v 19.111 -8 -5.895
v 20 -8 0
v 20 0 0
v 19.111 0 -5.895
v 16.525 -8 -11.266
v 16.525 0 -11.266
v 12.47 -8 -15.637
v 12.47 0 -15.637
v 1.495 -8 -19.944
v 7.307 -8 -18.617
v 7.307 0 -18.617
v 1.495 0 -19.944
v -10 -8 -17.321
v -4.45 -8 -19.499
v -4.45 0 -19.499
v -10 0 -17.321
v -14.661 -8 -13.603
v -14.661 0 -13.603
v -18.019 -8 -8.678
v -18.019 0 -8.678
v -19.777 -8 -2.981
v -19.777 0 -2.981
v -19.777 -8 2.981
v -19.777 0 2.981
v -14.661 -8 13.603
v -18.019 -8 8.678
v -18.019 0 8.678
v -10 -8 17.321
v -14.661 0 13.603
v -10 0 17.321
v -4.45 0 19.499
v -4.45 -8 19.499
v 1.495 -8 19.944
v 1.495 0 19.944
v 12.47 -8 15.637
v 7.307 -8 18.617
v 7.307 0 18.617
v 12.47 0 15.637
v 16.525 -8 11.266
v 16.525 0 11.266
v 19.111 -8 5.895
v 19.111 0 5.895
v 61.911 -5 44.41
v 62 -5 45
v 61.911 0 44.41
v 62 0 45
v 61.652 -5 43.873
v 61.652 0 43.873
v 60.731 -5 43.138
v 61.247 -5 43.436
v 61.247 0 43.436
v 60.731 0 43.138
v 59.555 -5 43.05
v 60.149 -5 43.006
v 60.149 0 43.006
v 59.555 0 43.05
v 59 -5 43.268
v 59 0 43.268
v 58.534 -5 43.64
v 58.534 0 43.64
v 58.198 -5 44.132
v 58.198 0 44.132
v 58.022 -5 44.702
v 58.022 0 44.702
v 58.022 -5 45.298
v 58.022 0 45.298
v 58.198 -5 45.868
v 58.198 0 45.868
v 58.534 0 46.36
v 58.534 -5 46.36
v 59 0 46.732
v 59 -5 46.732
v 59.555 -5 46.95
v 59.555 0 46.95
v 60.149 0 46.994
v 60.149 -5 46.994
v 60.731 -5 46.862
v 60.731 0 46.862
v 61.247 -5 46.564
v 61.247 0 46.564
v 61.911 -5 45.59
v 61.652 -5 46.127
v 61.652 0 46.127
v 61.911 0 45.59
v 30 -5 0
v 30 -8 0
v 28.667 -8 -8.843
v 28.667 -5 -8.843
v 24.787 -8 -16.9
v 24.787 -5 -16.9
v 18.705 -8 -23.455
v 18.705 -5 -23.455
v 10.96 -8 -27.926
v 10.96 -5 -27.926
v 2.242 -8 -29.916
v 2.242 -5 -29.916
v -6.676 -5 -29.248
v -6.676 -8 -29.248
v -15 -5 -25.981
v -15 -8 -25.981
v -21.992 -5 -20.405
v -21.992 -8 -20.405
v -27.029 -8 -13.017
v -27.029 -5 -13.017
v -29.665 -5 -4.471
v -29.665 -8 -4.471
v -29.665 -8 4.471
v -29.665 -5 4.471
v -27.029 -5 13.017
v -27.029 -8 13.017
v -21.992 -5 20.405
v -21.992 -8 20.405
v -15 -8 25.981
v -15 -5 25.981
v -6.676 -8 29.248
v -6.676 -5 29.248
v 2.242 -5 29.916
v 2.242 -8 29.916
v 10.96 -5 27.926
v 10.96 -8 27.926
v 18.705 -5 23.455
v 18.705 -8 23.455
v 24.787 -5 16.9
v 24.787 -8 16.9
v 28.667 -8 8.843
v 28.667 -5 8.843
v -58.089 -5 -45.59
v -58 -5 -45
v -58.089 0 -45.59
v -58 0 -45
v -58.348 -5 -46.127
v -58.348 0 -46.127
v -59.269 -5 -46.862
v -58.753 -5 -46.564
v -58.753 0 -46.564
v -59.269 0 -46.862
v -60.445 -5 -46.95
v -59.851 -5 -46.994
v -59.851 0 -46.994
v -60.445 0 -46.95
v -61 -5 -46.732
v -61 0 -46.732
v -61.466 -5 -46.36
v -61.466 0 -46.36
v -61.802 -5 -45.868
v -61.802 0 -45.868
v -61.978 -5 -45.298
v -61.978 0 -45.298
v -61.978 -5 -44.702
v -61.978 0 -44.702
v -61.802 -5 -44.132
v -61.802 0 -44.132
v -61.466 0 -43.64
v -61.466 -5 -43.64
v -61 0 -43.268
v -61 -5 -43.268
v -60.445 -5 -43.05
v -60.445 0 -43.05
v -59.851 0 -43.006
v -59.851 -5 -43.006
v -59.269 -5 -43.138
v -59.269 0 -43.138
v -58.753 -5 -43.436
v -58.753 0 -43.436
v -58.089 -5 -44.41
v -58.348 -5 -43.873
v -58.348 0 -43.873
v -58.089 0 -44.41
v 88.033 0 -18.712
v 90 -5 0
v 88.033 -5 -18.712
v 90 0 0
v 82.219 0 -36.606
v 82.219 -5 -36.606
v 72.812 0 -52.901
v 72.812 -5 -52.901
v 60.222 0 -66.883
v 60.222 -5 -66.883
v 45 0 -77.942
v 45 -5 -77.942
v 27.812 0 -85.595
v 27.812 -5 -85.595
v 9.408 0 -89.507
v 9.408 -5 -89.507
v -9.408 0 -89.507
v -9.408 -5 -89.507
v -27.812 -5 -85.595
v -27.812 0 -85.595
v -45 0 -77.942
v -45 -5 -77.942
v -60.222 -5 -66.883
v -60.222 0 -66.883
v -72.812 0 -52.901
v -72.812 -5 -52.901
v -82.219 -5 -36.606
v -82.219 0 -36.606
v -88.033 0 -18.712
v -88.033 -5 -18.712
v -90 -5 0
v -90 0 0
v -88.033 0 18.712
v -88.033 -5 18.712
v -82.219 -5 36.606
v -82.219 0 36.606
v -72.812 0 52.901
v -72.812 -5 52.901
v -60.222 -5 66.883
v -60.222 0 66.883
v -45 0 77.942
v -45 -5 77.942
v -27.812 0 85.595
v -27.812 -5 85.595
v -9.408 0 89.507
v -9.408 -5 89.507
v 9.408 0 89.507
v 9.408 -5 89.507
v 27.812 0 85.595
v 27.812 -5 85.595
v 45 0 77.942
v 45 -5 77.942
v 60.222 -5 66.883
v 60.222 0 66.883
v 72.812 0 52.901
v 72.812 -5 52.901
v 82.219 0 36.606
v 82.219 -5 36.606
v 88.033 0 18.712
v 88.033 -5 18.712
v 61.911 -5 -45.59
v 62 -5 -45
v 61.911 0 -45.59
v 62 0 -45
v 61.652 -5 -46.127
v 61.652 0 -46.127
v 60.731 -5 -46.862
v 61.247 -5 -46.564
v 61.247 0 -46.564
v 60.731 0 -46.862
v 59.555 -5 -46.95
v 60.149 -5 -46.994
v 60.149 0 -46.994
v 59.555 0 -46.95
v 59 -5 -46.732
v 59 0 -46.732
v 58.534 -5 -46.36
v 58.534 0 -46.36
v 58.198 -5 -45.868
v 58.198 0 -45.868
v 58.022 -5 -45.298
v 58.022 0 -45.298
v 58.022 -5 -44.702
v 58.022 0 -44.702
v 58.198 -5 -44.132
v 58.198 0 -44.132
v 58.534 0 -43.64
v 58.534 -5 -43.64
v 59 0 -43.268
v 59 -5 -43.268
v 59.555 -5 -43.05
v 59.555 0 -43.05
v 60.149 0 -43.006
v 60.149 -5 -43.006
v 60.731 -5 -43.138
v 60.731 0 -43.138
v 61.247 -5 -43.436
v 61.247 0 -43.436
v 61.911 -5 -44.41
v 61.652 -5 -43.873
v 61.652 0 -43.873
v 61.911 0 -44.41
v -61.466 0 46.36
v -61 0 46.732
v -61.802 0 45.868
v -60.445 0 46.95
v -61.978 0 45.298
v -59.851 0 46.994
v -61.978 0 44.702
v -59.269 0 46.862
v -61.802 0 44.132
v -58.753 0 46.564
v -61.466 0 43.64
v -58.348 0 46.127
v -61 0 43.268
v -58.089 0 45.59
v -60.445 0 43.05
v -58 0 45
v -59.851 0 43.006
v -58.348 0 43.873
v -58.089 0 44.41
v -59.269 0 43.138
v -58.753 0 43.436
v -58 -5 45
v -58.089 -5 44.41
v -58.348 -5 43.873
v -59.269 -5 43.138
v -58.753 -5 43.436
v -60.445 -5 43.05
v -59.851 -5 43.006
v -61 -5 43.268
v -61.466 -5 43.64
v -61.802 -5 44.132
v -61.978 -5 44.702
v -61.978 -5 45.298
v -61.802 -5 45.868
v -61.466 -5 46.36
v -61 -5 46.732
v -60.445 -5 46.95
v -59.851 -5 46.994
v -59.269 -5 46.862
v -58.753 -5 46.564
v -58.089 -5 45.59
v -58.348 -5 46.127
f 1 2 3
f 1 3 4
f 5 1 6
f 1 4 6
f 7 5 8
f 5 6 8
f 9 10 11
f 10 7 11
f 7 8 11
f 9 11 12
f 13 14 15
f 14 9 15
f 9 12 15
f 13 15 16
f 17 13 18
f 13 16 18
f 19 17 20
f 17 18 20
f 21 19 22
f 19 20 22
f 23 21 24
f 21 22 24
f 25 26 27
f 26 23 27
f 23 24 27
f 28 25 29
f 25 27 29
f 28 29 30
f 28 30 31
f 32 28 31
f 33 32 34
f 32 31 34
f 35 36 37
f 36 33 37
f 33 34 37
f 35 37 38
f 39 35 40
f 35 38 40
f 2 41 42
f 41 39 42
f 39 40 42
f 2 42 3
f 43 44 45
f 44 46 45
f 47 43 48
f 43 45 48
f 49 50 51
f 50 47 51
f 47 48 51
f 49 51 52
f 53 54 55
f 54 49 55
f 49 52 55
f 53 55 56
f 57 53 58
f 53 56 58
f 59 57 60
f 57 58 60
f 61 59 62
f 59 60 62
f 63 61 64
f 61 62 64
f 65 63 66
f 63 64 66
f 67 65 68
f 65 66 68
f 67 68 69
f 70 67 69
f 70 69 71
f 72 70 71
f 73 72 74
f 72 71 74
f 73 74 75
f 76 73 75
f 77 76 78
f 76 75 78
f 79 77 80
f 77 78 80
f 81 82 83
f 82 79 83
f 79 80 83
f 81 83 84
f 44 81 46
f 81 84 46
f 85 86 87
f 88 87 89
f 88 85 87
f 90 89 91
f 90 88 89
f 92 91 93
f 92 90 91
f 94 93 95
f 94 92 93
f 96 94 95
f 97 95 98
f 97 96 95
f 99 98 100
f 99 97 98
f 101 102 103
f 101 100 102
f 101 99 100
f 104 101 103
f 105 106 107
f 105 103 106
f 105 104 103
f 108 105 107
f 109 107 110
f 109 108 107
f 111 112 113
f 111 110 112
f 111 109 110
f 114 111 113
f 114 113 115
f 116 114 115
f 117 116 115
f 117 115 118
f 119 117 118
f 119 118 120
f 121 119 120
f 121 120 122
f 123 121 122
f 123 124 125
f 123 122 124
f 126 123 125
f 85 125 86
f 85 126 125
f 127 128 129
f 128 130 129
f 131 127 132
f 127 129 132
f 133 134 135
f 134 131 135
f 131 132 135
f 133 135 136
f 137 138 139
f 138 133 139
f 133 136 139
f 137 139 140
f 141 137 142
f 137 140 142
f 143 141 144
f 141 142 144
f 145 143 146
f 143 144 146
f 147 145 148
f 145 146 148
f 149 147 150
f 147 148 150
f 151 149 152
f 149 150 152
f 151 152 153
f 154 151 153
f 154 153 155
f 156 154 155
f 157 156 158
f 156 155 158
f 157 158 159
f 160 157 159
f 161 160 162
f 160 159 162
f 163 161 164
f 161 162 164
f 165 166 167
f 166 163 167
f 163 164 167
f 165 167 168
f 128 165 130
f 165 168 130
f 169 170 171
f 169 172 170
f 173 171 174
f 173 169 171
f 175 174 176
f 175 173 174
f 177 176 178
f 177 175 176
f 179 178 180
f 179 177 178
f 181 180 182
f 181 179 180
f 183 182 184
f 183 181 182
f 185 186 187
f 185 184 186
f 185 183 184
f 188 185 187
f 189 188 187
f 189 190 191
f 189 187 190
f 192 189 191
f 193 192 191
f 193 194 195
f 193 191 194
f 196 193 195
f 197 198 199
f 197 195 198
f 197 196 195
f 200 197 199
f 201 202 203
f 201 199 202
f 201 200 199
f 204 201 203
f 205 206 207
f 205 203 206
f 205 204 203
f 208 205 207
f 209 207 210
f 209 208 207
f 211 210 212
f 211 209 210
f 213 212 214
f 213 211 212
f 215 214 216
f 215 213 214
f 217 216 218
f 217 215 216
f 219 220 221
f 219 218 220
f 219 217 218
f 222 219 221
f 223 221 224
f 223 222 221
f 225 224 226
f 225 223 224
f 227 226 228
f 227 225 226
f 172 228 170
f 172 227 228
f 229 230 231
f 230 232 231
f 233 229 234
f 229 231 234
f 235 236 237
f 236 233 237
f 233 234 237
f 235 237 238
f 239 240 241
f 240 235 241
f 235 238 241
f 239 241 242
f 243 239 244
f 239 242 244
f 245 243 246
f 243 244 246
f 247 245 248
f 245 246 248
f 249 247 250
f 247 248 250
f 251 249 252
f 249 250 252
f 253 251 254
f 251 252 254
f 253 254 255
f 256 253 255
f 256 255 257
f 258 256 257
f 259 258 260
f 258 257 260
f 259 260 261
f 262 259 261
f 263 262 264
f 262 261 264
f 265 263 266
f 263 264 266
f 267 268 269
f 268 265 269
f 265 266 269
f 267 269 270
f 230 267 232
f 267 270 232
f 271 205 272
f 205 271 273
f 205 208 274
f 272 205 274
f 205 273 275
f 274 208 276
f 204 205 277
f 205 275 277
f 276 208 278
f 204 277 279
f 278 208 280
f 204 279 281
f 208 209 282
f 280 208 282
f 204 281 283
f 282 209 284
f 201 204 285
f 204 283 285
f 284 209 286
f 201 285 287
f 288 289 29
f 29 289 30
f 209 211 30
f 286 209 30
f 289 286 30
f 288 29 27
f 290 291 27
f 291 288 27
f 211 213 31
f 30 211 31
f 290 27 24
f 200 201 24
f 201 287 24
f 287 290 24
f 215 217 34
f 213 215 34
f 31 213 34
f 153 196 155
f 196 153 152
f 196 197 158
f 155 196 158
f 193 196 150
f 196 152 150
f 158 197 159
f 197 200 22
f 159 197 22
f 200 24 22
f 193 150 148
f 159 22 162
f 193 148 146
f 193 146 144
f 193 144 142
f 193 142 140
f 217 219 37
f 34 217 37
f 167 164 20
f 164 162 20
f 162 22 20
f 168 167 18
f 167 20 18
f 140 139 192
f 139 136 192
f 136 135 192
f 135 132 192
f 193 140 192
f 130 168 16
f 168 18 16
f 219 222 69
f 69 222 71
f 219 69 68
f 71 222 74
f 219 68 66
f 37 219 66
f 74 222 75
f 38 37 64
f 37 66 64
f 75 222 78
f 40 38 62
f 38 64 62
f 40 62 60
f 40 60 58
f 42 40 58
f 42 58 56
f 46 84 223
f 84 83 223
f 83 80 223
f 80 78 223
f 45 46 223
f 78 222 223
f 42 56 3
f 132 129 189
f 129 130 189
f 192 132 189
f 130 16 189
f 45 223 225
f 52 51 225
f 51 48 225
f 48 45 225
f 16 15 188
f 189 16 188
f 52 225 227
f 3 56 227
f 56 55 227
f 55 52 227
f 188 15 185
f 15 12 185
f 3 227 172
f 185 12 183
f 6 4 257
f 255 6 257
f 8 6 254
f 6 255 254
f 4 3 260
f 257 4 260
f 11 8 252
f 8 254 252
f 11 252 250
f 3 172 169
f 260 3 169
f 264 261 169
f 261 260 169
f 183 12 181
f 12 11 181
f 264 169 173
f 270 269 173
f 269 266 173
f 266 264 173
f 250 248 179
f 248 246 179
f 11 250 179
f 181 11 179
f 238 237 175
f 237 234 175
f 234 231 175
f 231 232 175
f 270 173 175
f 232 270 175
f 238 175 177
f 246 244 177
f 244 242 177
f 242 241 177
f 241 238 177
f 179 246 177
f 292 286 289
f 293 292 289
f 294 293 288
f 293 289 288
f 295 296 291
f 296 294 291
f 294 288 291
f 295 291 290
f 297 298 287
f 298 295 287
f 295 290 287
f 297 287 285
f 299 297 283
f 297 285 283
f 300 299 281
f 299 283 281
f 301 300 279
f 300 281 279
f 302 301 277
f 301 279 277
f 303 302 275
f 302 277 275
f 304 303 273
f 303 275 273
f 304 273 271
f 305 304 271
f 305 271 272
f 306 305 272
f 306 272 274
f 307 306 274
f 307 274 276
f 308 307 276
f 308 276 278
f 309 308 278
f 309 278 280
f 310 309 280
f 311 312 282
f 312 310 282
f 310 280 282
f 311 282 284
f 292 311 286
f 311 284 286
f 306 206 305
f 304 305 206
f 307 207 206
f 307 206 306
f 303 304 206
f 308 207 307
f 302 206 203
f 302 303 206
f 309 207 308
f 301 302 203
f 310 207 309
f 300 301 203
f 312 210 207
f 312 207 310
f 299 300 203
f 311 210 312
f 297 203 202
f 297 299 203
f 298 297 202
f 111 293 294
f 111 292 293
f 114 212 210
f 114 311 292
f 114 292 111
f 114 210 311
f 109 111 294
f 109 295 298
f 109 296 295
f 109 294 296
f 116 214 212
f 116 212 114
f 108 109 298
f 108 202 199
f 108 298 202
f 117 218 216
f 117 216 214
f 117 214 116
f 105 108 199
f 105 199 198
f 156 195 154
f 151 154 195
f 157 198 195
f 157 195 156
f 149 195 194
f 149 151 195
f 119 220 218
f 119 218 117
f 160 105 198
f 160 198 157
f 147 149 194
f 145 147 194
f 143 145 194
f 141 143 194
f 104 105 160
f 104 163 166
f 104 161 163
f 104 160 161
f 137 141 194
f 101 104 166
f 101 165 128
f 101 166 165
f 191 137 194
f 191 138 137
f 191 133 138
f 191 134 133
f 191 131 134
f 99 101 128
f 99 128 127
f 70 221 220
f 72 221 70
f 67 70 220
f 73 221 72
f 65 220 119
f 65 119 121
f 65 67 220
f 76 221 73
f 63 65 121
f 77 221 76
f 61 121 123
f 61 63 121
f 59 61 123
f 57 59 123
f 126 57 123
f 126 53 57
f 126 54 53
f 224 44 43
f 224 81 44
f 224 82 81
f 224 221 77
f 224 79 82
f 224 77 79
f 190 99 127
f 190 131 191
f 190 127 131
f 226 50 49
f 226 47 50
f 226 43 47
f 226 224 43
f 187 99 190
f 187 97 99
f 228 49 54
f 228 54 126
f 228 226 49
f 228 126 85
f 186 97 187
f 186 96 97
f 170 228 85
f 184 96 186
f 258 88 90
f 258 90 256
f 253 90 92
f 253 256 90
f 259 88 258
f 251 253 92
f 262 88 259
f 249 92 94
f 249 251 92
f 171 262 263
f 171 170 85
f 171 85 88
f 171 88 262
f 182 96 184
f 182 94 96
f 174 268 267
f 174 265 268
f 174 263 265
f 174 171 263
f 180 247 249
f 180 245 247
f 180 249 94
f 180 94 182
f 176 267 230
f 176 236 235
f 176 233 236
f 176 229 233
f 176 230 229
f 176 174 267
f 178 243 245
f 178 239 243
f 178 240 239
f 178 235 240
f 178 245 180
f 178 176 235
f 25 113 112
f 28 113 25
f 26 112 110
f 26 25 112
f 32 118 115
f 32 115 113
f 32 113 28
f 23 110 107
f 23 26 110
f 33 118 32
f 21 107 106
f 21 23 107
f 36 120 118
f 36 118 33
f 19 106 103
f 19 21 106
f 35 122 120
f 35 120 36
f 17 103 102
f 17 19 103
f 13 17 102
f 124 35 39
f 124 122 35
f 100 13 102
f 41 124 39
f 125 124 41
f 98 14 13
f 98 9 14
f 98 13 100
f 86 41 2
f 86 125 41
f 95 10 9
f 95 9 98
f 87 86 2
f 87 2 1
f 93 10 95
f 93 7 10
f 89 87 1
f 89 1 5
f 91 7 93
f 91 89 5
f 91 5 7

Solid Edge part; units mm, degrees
sketch "Sketch1" plane through (0, 0, 0) normal (0, -1, 0) x (1, 0, 0)
  circle A0 centre (60, 45) radius 2
  circle A1 centre (0, 0) radius 20
  circle A2 centre (0, 0) radius 90
  circle A3 centre (60, -45) radius 2
  circle A4 centre (-60, 45) radius 2
  circle A5 centre (-60, -45) radius 2
extrude "Protrusion1" add sketch "Sketch1" along normal blind 5
sketch "Sketch2" plane through (0, 0, 0) normal (0, -1, 0) x (1, 0, 0)
  circle A0 centre (0, 0) radius 30
  circle A1 centre (0, 0) radius 20
extrude "ExtrudedProtrusion_2" add sketch "Sketch2" along normal blind 8
